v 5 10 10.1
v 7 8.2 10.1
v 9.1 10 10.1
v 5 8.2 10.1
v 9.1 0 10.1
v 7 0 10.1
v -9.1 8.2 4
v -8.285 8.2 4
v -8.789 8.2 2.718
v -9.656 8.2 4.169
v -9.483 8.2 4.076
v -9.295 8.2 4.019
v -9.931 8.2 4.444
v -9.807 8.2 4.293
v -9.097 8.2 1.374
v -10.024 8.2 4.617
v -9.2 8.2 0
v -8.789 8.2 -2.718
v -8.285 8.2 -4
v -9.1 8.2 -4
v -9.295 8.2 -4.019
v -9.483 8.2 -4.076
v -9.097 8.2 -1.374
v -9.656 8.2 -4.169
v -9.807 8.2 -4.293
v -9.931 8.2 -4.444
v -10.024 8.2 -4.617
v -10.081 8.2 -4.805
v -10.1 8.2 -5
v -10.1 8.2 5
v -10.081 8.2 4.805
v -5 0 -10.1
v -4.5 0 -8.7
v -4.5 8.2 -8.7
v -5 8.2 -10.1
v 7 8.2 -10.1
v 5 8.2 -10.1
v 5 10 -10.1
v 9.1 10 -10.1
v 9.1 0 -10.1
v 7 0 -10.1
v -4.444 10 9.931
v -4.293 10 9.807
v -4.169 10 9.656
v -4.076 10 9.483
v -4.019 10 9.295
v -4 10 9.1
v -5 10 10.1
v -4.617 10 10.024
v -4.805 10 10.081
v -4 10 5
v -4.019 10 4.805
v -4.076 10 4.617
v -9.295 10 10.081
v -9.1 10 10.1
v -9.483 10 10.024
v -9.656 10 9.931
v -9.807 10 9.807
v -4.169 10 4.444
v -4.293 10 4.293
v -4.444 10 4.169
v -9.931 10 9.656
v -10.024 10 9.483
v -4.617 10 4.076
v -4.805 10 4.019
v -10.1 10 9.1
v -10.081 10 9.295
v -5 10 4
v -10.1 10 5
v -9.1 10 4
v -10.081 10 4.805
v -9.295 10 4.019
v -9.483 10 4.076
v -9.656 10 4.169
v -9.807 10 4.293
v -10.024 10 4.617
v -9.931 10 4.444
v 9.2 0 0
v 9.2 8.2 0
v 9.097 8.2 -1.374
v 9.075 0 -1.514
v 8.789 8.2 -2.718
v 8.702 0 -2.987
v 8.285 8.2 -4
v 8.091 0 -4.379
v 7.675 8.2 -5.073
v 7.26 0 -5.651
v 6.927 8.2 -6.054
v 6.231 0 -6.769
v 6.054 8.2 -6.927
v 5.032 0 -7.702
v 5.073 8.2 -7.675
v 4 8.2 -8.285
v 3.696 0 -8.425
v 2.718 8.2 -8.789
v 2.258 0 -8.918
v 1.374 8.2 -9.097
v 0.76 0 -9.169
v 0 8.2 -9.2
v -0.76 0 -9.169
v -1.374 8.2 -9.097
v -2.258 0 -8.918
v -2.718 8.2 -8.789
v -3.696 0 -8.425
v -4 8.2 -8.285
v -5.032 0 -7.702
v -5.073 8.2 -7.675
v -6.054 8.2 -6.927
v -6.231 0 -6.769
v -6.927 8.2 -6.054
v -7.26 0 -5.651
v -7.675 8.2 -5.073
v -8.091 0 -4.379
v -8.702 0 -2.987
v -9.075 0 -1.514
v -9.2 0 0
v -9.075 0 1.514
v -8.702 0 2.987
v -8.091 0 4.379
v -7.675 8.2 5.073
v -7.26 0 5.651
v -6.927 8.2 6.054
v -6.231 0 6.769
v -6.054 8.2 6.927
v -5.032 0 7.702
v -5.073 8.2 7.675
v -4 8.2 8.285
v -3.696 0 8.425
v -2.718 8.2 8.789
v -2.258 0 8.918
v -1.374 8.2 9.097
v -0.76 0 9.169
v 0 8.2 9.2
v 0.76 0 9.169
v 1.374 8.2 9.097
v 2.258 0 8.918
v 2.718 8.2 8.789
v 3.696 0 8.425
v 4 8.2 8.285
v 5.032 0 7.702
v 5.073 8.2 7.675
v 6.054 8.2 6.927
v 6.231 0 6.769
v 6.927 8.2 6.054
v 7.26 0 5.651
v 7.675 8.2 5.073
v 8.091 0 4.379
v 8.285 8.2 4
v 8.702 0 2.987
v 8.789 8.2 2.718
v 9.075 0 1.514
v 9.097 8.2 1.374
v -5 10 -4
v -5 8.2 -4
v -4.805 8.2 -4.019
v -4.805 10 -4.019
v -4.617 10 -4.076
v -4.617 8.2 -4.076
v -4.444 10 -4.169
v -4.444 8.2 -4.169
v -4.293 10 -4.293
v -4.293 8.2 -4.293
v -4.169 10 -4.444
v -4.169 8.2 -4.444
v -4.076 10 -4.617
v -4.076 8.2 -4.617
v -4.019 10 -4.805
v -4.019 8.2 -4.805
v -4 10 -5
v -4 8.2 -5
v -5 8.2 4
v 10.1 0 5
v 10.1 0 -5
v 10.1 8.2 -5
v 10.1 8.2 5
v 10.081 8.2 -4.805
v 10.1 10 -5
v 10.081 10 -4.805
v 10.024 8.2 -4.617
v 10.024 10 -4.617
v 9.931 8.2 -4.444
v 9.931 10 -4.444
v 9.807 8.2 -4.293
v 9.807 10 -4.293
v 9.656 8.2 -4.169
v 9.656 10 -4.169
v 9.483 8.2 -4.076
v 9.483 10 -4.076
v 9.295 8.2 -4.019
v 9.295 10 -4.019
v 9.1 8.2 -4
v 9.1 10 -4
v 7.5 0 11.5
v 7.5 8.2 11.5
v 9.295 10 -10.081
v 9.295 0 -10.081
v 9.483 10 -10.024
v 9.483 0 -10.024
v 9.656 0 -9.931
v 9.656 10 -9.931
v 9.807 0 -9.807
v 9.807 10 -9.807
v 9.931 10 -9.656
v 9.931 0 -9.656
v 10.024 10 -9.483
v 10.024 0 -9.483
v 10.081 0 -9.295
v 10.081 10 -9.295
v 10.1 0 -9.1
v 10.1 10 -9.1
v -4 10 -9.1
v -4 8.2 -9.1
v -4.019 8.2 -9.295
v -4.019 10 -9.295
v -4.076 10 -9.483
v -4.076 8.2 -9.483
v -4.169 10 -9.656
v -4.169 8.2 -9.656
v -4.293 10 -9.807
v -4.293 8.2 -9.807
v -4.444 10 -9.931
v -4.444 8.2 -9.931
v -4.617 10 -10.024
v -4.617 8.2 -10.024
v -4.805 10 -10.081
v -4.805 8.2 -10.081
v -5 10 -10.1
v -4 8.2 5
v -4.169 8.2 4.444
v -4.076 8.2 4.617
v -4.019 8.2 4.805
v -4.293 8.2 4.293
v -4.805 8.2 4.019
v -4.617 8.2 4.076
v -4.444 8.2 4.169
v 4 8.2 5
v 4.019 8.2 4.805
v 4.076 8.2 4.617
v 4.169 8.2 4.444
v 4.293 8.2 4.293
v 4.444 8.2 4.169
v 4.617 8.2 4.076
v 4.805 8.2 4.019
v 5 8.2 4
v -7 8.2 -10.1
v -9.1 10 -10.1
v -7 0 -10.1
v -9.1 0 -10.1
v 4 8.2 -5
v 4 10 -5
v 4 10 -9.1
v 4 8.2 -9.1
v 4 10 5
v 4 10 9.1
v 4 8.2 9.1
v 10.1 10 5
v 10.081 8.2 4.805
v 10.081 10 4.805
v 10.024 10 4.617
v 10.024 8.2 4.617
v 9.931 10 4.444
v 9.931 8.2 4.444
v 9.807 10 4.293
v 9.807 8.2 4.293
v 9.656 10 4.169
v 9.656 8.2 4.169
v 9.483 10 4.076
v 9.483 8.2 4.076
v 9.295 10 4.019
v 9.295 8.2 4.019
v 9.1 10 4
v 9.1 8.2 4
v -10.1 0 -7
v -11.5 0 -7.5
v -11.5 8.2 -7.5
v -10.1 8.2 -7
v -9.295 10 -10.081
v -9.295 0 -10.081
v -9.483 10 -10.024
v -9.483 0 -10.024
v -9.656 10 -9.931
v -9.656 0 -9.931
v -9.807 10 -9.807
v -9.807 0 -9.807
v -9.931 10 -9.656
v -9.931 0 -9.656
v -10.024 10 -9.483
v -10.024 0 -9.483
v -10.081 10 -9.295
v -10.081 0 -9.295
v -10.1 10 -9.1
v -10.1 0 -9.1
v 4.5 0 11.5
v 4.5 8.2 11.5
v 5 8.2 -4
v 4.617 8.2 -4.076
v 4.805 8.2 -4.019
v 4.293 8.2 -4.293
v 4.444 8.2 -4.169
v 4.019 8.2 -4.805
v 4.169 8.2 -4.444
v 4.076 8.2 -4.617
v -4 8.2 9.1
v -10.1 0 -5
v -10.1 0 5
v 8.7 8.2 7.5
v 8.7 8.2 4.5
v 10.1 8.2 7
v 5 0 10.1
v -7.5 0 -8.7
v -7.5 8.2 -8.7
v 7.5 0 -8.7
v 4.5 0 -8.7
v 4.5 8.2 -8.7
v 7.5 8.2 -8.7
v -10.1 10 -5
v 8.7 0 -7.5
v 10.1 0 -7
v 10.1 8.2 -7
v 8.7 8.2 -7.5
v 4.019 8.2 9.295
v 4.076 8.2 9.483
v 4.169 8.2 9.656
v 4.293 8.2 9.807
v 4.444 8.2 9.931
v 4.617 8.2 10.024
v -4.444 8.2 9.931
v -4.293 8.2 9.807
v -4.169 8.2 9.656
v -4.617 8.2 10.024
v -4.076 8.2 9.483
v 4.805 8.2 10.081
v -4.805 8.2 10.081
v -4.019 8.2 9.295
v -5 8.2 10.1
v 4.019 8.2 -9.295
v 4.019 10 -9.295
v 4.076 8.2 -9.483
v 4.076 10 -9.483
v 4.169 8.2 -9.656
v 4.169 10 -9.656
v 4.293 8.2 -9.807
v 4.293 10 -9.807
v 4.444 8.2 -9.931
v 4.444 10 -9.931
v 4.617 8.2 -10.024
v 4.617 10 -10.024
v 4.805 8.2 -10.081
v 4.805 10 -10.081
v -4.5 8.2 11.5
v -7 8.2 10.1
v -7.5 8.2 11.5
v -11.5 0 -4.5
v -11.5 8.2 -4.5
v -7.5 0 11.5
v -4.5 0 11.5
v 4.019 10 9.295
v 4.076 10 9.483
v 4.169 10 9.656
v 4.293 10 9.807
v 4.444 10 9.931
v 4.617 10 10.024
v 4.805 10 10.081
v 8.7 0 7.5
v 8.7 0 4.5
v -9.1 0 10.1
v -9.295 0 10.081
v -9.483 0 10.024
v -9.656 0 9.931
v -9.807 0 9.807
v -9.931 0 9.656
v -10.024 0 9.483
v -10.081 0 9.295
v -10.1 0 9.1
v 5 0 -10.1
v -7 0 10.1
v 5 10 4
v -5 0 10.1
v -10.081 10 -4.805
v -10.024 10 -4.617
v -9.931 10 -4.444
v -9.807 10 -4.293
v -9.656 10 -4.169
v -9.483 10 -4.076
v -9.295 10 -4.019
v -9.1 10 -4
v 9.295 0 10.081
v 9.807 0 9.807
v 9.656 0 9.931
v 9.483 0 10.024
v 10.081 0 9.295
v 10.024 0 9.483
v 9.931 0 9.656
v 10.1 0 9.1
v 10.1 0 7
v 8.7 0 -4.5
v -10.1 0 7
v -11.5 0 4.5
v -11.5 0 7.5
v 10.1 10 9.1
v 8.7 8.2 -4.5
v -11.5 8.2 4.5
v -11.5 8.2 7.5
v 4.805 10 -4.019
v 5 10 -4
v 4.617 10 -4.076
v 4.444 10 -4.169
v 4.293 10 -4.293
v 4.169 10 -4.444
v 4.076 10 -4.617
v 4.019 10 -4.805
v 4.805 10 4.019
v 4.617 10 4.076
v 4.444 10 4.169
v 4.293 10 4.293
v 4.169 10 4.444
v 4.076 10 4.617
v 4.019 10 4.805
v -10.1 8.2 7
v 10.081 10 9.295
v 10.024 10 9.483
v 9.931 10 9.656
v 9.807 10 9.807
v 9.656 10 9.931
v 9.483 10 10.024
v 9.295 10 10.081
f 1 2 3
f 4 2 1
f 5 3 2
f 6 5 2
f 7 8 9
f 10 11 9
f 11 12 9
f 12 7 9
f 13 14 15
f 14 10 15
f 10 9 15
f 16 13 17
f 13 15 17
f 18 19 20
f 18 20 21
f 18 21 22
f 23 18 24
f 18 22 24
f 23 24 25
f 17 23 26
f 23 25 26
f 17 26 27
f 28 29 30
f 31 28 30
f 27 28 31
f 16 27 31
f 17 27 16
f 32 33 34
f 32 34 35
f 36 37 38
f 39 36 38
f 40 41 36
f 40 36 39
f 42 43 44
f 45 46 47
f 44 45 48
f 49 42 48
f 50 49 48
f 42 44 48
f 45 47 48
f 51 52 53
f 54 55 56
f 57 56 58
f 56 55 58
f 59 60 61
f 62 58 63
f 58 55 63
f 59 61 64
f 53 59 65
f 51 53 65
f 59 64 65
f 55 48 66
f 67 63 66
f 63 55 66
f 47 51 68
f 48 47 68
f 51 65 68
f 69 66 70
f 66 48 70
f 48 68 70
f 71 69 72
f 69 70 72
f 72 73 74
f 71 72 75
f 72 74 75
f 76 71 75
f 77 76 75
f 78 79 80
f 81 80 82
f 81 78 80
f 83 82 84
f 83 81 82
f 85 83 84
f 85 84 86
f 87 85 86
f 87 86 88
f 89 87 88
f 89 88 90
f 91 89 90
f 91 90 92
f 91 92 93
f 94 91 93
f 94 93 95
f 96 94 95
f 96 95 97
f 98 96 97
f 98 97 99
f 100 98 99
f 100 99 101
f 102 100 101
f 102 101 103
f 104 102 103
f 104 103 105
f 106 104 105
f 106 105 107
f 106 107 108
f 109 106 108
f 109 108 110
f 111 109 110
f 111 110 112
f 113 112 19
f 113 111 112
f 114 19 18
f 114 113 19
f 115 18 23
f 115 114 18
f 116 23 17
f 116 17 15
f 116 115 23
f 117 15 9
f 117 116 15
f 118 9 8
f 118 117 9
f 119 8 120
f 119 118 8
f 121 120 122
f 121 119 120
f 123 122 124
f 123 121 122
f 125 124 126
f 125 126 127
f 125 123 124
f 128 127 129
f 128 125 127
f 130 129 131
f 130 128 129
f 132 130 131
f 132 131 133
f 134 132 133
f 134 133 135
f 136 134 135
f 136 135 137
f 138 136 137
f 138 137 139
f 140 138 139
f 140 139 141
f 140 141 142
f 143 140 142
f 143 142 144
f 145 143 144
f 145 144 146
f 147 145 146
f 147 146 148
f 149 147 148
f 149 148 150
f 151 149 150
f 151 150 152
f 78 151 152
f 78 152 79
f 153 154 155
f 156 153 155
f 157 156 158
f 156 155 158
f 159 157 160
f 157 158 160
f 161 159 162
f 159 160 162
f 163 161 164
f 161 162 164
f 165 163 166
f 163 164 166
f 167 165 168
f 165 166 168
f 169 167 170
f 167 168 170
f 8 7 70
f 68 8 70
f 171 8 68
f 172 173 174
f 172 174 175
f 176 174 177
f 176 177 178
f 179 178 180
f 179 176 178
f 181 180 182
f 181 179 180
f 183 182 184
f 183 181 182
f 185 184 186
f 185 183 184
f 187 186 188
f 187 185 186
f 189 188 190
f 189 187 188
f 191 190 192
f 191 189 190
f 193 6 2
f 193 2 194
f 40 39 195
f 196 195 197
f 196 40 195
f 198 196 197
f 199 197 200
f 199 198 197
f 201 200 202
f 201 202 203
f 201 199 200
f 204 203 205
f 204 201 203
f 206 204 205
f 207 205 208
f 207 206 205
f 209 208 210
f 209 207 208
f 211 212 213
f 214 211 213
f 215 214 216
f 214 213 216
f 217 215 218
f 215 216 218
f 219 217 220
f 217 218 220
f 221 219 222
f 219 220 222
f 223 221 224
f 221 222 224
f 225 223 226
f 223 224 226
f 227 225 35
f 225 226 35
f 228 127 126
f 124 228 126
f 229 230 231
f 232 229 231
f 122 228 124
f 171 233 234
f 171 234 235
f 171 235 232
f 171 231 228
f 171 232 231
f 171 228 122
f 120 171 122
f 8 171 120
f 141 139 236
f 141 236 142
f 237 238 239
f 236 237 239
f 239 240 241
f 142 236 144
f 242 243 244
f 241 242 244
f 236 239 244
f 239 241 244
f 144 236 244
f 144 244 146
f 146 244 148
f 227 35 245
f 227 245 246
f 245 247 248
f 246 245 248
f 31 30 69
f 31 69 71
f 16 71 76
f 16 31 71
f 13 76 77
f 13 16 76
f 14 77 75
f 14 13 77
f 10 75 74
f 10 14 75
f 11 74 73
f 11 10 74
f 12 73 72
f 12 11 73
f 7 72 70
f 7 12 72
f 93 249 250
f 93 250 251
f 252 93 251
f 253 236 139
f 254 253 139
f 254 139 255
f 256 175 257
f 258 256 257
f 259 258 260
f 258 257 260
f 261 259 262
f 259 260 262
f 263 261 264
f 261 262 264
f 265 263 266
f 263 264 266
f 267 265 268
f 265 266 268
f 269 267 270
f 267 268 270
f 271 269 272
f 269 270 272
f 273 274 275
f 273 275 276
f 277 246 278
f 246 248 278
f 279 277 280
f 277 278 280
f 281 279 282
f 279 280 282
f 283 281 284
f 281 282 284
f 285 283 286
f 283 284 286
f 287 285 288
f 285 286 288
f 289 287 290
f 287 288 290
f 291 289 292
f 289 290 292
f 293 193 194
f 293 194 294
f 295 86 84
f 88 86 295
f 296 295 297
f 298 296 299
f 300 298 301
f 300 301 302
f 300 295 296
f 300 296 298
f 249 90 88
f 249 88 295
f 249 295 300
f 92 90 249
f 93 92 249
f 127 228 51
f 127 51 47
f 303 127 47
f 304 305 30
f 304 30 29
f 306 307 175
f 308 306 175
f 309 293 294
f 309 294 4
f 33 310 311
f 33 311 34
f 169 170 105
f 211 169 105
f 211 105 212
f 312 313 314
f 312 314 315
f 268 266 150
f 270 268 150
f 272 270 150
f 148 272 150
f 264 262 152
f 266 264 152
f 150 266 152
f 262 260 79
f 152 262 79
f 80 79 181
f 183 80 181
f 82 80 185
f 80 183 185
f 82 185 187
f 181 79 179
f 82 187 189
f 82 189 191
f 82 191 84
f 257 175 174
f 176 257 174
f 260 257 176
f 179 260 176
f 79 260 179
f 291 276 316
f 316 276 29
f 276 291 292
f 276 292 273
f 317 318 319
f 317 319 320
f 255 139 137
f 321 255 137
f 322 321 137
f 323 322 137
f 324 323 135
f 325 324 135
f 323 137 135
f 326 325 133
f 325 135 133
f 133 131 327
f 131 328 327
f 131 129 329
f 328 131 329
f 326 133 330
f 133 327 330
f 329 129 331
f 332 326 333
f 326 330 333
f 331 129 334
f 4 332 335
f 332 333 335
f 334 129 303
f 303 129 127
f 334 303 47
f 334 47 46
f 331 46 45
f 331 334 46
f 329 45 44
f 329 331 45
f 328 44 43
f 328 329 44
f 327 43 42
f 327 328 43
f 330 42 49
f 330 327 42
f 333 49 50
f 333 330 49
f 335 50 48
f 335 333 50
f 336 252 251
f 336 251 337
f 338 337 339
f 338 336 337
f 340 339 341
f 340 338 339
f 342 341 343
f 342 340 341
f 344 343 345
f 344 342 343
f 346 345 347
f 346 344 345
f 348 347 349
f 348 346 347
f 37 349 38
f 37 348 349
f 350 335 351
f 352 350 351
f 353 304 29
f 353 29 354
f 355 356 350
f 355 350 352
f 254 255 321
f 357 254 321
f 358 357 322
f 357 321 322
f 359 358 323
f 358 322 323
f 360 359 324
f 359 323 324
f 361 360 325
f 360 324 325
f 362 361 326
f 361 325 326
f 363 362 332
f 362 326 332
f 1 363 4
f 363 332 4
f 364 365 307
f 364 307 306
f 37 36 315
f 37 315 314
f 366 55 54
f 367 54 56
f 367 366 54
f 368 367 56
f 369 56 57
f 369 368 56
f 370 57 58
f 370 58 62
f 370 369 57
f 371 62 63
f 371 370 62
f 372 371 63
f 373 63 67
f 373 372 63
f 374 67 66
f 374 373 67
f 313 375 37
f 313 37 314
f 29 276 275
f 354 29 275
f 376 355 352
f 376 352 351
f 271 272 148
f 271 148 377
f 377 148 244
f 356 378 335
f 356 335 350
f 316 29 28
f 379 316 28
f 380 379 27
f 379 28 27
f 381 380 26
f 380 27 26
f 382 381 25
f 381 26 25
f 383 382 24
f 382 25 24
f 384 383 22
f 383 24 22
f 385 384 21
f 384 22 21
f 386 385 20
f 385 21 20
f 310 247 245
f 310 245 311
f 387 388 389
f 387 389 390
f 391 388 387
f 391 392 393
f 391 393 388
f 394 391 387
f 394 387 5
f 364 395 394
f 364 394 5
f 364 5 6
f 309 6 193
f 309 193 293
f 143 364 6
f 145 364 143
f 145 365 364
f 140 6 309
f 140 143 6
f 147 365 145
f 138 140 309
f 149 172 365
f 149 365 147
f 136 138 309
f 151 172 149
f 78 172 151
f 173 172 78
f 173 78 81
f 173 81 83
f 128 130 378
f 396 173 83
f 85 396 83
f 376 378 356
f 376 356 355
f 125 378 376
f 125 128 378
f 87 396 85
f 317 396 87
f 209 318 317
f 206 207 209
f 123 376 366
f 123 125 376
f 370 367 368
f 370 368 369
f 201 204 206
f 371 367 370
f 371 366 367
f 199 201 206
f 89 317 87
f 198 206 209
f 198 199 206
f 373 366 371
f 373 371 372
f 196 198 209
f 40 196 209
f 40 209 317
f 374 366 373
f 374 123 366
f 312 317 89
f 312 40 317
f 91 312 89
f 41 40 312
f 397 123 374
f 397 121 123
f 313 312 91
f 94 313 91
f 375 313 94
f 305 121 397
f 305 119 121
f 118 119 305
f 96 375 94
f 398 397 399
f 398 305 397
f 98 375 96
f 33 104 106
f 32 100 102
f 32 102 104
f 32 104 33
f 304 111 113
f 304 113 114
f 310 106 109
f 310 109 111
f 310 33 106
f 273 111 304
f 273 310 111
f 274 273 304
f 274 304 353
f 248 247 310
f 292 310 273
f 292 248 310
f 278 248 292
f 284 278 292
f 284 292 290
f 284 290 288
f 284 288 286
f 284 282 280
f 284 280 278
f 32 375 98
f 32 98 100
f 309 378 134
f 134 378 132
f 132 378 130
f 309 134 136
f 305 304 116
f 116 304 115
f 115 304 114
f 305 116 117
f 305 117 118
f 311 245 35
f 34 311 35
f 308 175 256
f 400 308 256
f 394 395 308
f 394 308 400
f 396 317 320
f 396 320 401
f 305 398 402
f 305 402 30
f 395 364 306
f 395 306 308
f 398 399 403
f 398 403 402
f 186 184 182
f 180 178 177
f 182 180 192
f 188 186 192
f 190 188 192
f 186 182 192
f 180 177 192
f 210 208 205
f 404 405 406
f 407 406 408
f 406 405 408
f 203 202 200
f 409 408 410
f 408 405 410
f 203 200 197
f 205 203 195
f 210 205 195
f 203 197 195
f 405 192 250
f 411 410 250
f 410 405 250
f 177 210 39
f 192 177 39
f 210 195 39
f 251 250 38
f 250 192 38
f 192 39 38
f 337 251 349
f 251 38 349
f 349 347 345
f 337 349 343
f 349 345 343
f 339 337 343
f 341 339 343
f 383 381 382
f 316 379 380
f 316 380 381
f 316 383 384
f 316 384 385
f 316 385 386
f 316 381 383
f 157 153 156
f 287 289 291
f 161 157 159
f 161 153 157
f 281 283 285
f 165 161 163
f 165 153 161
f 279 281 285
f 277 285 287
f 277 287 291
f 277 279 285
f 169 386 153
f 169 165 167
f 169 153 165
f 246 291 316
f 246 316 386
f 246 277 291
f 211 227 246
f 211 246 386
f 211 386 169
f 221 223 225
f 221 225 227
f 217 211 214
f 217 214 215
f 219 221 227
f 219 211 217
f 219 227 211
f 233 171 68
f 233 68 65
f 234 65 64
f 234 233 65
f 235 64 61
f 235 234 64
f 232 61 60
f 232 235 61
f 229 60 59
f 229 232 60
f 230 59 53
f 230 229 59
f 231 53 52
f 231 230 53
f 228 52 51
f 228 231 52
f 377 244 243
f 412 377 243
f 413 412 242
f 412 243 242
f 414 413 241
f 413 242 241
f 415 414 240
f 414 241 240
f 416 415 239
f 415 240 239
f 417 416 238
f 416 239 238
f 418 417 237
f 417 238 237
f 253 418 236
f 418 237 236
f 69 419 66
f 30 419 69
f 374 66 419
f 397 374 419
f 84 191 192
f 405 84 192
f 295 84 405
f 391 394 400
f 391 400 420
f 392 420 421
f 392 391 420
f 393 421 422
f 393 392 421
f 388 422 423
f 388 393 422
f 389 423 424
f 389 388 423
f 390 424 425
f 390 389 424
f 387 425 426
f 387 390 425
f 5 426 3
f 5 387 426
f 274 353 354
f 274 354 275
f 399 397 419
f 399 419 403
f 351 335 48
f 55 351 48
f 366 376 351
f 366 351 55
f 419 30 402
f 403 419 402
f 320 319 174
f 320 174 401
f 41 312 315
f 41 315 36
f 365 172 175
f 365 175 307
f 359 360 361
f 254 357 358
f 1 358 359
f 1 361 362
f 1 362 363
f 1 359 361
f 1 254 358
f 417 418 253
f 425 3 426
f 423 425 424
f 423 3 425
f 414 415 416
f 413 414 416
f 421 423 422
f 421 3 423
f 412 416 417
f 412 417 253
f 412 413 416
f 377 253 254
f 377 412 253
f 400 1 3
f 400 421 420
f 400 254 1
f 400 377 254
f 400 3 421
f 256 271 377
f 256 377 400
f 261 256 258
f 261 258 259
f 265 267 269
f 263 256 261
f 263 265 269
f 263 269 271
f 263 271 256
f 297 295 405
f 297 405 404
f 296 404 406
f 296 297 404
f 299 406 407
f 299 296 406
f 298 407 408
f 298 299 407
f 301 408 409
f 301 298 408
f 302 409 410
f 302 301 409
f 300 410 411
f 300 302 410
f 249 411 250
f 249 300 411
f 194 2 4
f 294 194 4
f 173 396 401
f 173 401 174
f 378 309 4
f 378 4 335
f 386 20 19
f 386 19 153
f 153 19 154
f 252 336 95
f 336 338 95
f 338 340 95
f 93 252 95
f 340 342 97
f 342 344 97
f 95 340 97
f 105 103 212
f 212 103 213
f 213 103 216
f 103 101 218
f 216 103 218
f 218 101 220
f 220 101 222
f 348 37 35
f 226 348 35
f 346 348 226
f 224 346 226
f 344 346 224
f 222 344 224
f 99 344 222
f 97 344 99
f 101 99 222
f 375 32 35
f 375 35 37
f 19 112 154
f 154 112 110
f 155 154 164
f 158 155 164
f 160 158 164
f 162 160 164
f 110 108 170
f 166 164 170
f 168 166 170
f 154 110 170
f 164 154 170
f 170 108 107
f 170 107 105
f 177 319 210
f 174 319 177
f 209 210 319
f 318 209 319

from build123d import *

# Parameters (mm, degrees)
SKETCH1_R           = 9.2
BOSS_EXTRUDE1_DEPTH = 8.2
BOSS_EXTRUDE2_DEPTH = 1.8


with BuildPart() as part:
    # Sketch1 → Boss-Extrude1 (new body)
    with BuildSketch(Plane(origin=(0, 0, 0), x_dir=(1, 0, 0), z_dir=(0, 1, 0))):
        with BuildLine():
            Line((-9.1, 10.1), (-7, 10.1))
            Line((-7, 10.1), (-7.5, 8.7))
            Line((-7.5, 8.7), (-4.5, 8.7))
            Line((-4.5, 8.7), (-5, 10.1))
            Line((-5, 10.1), (5, 10.1))
            Line((5, 10.1), (4.5, 8.7))
            Line((4.5, 8.7), (7.5, 8.7))
            Line((7.5, 8.7), (7, 10.1))
            Line((7, 10.1), (9.1, 10.1))
            ThreePointArc((9.1, 10.1), (9.807106781, 9.807106781), (10.1, 9.1))
            Line((10.1, 9.1), (10.1, 7))
            Line((10.1, 7), (8.7, 7.5))
            Line((8.7, 7.5), (8.7, 4.5))
            Line((8.7, 4.5), (10.1, 5))
            Line((10.1, 5), (10.1, -5))
            Line((10.1, -5), (8.7, -4.5))
            Line((8.7, -4.5), (8.7, -7.5))
            Line((8.7, -7.5), (10.1, -7))
            Line((10.1, -7), (10.1, -9.1))
            ThreePointArc((10.1, -9.1), (9.807106781, -9.807106781), (9.1, -10.1))
            Line((9.1, -10.1), (7, -10.1))
            Line((7, -10.1), (7.5, -11.5))
            Line((7.5, -11.5), (4.5, -11.5))
            Line((4.5, -11.5), (5, -10.1))
            Line((5, -10.1), (-5, -10.1))
            Line((-5, -10.1), (-4.5, -11.5))
            Line((-4.5, -11.5), (-7.5, -11.5))
            Line((-7.5, -11.5), (-7, -10.1))
            Line((-7, -10.1), (-9.1, -10.1))
            ThreePointArc((-9.1, -10.1), (-9.807106781, -9.807106781), (-10.1, -9.1))
            Line((-10.1, -9.1), (-10.1, -7))
            Line((-10.1, -7), (-11.5, -7.5))
            Line((-11.5, -7.5), (-11.5, -4.5))
            Line((-11.5, -4.5), (-10.1, -5))
            Line((-10.1, -5), (-10.1, 5))
            Line((-10.1, 5), (-11.5, 4.5))
            Line((-11.5, 4.5), (-11.5, 7.5))
            Line((-11.5, 7.5), (-10.1, 7))
            Line((-10.1, 7), (-10.1, 9.1))
            ThreePointArc((-10.1, 9.1), (-9.807106781, 9.807106781), (-9.1, 10.1))
        make_face()
        Circle(SKETCH1_R, mode=Mode.SUBTRACT)
    extrude(amount=BOSS_EXTRUDE1_DEPTH)

    # Sketch2 → Boss-Extrude2 (add)
    with BuildSketch(Plane(origin=(0, 8.2, 0), x_dir=(1, 0, 0), z_dir=(0, 1, 0))):
        with BuildLine():
            Line((-9.1, 4), (-5, 4))
            ThreePointArc((-5, 4), (-4.292893219, 4.292893219), (-4, 5))
            Line((-4, 5), (-4, 9.1))
            ThreePointArc((-4, 9.1), (-4.292893219, 9.807106781), (-5, 10.1))
            Line((-5, 10.1), (-9.1, 10.1))
            ThreePointArc((-9.1, 10.1), (-9.807106781, 9.807106781), (-10.1, 9.1))
            Line((-10.1, 9.1), (-10.1, 5))
            ThreePointArc((-10.1, 5), (-9.807106781, 4.292893219), (-9.1, 4))
        make_face()
        with BuildLine():
            Line((10.1, 9.1), (10.1, 5))
            ThreePointArc((10.1, 5), (9.807106781, 4.292893219), (9.1, 4))
            Line((9.1, 4), (5, 4))
            ThreePointArc((5, 4), (4.292893219, 4.292893219), (4, 5))
            Line((4, 5), (4, 9.1))
            ThreePointArc((4, 9.1), (4.292893219, 9.807106781), (5, 10.1))
            Line((5, 10.1), (9.1, 10.1))
            ThreePointArc((9.1, 10.1), (9.807106781, 9.807106781), (10.1, 9.1))
        make_face()
        with BuildLine():
            Line((9.1, -4), (5, -4))
            ThreePointArc((5, -4), (4.292893219, -4.292893219), (4, -5))
            Line((4, -5), (4, -9.1))
            ThreePointArc((4, -9.1), (4.292893219, -9.807106781), (5, -10.1))
            Line((5, -10.1), (9.1, -10.1))
            ThreePointArc((9.1, -10.1), (9.807106781, -9.807106781), (10.1, -9.1))
            Line((10.1, -9.1), (10.1, -5))
            ThreePointArc((10.1, -5), (9.807106781, -4.292893219), (9.1, -4))
        make_face()
        with BuildLine():
            Line((-4, -5), (-4, -9.1))
            ThreePointArc((-4, -9.1), (-4.292893219, -9.807106781), (-5, -10.1))
            Line((-5, -10.1), (-9.1, -10.1))
            ThreePointArc((-9.1, -10.1), (-9.807106781, -9.807106781), (-10.1, -9.1))
            Line((-10.1, -9.1), (-10.1, -5))
            ThreePointArc((-10.1, -5), (-9.807106781, -4.292893219), (-9.1, -4))
            Line((-9.1, -4), (-5, -4))
            ThreePointArc((-5, -4), (-4.292893219, -4.292893219), (-4, -5))
        make_face()
    extrude(amount=BOSS_EXTRUDE2_DEPTH)


solid = part.part
